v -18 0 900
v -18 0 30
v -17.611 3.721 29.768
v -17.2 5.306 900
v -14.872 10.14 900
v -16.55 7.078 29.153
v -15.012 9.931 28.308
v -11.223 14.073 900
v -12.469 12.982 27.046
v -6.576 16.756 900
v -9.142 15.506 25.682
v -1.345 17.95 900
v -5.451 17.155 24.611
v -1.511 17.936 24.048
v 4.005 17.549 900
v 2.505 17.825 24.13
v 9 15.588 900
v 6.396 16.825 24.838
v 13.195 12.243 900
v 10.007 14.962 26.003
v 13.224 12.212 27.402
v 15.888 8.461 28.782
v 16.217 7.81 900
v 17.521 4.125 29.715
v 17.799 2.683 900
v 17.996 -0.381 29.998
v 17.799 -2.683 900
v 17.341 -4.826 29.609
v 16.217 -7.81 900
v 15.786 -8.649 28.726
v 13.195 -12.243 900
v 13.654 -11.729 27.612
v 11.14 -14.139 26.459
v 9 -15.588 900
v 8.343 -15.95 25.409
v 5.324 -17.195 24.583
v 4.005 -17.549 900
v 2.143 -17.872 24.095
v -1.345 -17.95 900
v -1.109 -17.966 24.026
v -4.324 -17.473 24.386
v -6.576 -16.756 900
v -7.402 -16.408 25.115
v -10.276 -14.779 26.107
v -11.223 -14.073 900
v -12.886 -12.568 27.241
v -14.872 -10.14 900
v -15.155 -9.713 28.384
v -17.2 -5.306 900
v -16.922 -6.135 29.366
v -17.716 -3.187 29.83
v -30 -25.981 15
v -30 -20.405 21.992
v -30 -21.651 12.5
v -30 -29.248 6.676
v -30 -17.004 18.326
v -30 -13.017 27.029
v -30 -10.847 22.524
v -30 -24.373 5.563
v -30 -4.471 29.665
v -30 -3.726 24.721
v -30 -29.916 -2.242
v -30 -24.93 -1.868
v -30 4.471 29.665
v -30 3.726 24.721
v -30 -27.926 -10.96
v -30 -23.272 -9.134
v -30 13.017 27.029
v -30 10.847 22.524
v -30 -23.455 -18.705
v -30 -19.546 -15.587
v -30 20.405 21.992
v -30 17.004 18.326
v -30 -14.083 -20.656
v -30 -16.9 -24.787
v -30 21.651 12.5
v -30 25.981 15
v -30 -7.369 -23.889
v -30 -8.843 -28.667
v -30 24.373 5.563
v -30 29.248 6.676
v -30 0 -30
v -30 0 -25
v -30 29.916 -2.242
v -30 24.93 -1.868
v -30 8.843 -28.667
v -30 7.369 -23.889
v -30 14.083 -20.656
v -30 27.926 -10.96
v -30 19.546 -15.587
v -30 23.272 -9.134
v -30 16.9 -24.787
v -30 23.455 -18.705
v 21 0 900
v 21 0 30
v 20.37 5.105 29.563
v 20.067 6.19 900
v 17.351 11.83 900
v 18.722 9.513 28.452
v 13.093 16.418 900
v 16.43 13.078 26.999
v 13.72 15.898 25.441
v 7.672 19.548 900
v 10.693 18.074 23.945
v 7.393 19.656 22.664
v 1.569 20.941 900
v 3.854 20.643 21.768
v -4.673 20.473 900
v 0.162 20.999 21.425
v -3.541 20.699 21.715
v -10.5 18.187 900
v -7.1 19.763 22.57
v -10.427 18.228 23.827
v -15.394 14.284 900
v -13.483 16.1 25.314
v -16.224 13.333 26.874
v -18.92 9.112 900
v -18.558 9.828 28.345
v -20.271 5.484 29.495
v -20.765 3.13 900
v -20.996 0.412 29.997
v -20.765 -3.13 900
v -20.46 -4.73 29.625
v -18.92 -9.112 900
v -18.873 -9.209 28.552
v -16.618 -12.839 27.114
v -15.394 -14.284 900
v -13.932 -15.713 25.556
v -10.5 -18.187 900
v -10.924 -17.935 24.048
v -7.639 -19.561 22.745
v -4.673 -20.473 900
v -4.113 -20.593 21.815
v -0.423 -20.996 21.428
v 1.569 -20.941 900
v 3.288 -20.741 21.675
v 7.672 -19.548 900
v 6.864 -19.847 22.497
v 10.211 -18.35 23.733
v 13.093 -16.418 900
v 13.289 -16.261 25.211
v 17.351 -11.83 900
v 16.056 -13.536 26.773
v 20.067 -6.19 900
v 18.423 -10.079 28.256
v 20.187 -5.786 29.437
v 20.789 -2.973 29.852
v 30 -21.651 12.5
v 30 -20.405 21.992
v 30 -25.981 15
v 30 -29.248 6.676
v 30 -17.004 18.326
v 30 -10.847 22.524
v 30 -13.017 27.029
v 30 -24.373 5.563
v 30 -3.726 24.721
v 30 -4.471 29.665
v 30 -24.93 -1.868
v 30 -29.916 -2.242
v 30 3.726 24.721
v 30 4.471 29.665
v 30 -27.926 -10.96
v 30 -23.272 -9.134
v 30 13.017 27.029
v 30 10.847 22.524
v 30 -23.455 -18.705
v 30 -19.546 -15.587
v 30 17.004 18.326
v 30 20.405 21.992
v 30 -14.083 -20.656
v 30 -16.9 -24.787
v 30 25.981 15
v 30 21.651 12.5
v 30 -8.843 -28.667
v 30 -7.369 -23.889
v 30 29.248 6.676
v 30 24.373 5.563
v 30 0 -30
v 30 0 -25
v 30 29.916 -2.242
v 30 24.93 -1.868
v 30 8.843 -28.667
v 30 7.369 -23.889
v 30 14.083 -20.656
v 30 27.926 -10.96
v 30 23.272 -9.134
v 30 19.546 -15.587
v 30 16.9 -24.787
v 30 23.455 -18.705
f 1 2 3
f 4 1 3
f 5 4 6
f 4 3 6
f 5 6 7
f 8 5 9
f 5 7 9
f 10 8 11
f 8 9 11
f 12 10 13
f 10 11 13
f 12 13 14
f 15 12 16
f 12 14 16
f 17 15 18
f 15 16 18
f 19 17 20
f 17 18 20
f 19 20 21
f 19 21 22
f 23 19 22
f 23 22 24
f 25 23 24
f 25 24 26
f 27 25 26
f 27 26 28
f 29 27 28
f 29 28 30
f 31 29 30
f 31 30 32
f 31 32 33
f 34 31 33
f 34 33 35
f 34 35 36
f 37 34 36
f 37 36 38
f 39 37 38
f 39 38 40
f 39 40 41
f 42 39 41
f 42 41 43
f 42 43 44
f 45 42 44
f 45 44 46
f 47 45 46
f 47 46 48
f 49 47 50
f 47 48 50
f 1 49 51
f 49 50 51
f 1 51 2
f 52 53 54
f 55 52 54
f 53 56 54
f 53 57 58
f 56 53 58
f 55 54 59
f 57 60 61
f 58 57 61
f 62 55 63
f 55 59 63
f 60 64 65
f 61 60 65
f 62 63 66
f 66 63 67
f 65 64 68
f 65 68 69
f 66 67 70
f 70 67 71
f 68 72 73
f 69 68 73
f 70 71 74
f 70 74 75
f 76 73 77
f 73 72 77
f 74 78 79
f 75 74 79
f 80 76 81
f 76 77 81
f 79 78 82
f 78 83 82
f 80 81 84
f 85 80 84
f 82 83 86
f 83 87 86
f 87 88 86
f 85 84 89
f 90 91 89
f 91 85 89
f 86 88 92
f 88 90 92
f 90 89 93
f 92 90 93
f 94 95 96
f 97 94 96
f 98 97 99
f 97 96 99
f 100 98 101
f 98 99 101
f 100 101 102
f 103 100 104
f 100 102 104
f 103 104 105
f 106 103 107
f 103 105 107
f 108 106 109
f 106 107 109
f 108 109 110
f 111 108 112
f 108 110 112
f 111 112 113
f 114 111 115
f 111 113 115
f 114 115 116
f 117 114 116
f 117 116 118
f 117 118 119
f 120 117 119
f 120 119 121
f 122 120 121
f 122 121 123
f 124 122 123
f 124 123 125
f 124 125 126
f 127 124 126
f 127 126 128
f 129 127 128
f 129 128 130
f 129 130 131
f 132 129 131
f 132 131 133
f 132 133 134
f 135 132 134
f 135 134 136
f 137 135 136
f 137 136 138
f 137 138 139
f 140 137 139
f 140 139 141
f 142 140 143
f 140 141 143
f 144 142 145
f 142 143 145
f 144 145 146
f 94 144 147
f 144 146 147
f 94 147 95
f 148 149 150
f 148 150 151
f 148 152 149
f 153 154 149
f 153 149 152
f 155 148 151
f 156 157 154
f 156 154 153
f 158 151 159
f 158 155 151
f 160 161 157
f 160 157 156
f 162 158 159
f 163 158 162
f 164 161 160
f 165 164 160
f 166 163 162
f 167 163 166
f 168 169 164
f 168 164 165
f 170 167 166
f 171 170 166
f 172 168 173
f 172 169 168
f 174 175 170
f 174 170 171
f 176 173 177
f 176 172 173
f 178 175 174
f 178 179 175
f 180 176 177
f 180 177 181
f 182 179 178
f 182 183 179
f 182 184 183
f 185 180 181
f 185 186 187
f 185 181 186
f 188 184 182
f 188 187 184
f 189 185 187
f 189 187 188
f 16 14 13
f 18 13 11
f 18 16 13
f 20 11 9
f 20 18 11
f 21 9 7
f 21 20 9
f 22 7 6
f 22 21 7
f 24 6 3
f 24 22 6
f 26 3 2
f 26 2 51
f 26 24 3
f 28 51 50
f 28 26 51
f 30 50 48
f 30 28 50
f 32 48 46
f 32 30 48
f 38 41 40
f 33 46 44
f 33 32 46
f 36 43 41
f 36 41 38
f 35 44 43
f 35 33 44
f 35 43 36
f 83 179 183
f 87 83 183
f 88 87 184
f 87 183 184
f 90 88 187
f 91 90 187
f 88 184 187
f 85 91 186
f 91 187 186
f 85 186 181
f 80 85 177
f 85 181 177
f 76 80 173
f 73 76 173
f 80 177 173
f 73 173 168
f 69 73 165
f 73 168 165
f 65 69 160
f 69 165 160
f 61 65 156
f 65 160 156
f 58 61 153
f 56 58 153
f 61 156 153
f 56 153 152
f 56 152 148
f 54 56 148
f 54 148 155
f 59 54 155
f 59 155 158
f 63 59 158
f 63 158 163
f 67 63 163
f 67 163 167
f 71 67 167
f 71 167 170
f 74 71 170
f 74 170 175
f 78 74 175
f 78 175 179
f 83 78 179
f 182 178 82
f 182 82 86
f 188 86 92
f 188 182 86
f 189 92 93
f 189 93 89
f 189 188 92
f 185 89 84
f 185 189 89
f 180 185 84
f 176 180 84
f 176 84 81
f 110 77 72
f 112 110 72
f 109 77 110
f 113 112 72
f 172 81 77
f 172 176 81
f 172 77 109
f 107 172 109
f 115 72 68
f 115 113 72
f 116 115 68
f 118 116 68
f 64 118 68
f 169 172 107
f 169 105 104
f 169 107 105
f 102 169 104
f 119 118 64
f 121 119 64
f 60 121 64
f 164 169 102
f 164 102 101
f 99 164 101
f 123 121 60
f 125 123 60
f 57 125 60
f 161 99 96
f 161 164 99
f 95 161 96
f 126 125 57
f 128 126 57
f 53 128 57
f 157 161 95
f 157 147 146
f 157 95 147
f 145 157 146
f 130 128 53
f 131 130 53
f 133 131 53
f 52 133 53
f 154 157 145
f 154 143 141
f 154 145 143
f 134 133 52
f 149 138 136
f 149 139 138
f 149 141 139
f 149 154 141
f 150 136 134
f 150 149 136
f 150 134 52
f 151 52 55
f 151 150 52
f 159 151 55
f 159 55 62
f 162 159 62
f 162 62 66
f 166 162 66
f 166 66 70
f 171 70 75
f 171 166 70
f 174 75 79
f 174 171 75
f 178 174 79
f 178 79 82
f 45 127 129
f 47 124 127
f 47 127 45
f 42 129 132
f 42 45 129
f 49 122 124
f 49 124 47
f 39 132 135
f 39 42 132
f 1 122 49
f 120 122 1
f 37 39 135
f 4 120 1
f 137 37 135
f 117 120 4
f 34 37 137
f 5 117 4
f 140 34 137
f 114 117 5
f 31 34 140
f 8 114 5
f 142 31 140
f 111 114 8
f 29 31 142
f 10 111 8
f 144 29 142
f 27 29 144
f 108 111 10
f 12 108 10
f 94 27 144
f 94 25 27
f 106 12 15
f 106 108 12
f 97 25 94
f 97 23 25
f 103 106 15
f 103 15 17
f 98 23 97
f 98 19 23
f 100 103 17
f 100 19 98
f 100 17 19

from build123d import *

# Parameters (mm, degrees)
SKETCH_1_R          = 21
EXTRUDE_1_DEPTH     = 900
SKETCH_2_R          = 18
CUT_EXTRUDE_1_DEPTH = 901
SKETCH_4_R          = 30
EXTRUDE_2_DEPTH     = 30
SKETCH_5_R          = 25
CUT_EXTRUDE_2_DEPTH = 61.0000001


with BuildPart() as part:
    # Эскиз1 → Бобышка-Вытянуть1 (new body)
    with BuildSketch(Plane.XY):
        Circle(SKETCH_1_R)
    extrude(amount=EXTRUDE_1_DEPTH)

    # Эскиз2 → Вырез-Вытянуть1 (cut, through all)
    with BuildSketch(Plane(origin=(0, 0, 0), x_dir=(-1, 0, 0), z_dir=(0, 0, -1))):
        Circle(SKETCH_2_R)
    extrude(amount=-CUT_EXTRUDE_1_DEPTH, mode=Mode.SUBTRACT)

    # Эскиз4 → Бобышка-Вытянуть2 (add, symmetric)
    with BuildSketch(Plane(origin=(0, 0, 0), x_dir=(0, 0, -1), z_dir=(1, 0, 0))):
        Circle(SKETCH_4_R)
    extrude(amount=EXTRUDE_2_DEPTH, both=True)

    # Эскиз5 → Вырез-Вытянуть2 (cut, through all)
    with BuildSketch(Plane(origin=(30, 0, 0), x_dir=(0, 0, -1), z_dir=(1, 0, 0))):
        Circle(SKETCH_5_R)
    extrude(amount=-CUT_EXTRUDE_2_DEPTH, mode=Mode.SUBTRACT)


solid = part.part
